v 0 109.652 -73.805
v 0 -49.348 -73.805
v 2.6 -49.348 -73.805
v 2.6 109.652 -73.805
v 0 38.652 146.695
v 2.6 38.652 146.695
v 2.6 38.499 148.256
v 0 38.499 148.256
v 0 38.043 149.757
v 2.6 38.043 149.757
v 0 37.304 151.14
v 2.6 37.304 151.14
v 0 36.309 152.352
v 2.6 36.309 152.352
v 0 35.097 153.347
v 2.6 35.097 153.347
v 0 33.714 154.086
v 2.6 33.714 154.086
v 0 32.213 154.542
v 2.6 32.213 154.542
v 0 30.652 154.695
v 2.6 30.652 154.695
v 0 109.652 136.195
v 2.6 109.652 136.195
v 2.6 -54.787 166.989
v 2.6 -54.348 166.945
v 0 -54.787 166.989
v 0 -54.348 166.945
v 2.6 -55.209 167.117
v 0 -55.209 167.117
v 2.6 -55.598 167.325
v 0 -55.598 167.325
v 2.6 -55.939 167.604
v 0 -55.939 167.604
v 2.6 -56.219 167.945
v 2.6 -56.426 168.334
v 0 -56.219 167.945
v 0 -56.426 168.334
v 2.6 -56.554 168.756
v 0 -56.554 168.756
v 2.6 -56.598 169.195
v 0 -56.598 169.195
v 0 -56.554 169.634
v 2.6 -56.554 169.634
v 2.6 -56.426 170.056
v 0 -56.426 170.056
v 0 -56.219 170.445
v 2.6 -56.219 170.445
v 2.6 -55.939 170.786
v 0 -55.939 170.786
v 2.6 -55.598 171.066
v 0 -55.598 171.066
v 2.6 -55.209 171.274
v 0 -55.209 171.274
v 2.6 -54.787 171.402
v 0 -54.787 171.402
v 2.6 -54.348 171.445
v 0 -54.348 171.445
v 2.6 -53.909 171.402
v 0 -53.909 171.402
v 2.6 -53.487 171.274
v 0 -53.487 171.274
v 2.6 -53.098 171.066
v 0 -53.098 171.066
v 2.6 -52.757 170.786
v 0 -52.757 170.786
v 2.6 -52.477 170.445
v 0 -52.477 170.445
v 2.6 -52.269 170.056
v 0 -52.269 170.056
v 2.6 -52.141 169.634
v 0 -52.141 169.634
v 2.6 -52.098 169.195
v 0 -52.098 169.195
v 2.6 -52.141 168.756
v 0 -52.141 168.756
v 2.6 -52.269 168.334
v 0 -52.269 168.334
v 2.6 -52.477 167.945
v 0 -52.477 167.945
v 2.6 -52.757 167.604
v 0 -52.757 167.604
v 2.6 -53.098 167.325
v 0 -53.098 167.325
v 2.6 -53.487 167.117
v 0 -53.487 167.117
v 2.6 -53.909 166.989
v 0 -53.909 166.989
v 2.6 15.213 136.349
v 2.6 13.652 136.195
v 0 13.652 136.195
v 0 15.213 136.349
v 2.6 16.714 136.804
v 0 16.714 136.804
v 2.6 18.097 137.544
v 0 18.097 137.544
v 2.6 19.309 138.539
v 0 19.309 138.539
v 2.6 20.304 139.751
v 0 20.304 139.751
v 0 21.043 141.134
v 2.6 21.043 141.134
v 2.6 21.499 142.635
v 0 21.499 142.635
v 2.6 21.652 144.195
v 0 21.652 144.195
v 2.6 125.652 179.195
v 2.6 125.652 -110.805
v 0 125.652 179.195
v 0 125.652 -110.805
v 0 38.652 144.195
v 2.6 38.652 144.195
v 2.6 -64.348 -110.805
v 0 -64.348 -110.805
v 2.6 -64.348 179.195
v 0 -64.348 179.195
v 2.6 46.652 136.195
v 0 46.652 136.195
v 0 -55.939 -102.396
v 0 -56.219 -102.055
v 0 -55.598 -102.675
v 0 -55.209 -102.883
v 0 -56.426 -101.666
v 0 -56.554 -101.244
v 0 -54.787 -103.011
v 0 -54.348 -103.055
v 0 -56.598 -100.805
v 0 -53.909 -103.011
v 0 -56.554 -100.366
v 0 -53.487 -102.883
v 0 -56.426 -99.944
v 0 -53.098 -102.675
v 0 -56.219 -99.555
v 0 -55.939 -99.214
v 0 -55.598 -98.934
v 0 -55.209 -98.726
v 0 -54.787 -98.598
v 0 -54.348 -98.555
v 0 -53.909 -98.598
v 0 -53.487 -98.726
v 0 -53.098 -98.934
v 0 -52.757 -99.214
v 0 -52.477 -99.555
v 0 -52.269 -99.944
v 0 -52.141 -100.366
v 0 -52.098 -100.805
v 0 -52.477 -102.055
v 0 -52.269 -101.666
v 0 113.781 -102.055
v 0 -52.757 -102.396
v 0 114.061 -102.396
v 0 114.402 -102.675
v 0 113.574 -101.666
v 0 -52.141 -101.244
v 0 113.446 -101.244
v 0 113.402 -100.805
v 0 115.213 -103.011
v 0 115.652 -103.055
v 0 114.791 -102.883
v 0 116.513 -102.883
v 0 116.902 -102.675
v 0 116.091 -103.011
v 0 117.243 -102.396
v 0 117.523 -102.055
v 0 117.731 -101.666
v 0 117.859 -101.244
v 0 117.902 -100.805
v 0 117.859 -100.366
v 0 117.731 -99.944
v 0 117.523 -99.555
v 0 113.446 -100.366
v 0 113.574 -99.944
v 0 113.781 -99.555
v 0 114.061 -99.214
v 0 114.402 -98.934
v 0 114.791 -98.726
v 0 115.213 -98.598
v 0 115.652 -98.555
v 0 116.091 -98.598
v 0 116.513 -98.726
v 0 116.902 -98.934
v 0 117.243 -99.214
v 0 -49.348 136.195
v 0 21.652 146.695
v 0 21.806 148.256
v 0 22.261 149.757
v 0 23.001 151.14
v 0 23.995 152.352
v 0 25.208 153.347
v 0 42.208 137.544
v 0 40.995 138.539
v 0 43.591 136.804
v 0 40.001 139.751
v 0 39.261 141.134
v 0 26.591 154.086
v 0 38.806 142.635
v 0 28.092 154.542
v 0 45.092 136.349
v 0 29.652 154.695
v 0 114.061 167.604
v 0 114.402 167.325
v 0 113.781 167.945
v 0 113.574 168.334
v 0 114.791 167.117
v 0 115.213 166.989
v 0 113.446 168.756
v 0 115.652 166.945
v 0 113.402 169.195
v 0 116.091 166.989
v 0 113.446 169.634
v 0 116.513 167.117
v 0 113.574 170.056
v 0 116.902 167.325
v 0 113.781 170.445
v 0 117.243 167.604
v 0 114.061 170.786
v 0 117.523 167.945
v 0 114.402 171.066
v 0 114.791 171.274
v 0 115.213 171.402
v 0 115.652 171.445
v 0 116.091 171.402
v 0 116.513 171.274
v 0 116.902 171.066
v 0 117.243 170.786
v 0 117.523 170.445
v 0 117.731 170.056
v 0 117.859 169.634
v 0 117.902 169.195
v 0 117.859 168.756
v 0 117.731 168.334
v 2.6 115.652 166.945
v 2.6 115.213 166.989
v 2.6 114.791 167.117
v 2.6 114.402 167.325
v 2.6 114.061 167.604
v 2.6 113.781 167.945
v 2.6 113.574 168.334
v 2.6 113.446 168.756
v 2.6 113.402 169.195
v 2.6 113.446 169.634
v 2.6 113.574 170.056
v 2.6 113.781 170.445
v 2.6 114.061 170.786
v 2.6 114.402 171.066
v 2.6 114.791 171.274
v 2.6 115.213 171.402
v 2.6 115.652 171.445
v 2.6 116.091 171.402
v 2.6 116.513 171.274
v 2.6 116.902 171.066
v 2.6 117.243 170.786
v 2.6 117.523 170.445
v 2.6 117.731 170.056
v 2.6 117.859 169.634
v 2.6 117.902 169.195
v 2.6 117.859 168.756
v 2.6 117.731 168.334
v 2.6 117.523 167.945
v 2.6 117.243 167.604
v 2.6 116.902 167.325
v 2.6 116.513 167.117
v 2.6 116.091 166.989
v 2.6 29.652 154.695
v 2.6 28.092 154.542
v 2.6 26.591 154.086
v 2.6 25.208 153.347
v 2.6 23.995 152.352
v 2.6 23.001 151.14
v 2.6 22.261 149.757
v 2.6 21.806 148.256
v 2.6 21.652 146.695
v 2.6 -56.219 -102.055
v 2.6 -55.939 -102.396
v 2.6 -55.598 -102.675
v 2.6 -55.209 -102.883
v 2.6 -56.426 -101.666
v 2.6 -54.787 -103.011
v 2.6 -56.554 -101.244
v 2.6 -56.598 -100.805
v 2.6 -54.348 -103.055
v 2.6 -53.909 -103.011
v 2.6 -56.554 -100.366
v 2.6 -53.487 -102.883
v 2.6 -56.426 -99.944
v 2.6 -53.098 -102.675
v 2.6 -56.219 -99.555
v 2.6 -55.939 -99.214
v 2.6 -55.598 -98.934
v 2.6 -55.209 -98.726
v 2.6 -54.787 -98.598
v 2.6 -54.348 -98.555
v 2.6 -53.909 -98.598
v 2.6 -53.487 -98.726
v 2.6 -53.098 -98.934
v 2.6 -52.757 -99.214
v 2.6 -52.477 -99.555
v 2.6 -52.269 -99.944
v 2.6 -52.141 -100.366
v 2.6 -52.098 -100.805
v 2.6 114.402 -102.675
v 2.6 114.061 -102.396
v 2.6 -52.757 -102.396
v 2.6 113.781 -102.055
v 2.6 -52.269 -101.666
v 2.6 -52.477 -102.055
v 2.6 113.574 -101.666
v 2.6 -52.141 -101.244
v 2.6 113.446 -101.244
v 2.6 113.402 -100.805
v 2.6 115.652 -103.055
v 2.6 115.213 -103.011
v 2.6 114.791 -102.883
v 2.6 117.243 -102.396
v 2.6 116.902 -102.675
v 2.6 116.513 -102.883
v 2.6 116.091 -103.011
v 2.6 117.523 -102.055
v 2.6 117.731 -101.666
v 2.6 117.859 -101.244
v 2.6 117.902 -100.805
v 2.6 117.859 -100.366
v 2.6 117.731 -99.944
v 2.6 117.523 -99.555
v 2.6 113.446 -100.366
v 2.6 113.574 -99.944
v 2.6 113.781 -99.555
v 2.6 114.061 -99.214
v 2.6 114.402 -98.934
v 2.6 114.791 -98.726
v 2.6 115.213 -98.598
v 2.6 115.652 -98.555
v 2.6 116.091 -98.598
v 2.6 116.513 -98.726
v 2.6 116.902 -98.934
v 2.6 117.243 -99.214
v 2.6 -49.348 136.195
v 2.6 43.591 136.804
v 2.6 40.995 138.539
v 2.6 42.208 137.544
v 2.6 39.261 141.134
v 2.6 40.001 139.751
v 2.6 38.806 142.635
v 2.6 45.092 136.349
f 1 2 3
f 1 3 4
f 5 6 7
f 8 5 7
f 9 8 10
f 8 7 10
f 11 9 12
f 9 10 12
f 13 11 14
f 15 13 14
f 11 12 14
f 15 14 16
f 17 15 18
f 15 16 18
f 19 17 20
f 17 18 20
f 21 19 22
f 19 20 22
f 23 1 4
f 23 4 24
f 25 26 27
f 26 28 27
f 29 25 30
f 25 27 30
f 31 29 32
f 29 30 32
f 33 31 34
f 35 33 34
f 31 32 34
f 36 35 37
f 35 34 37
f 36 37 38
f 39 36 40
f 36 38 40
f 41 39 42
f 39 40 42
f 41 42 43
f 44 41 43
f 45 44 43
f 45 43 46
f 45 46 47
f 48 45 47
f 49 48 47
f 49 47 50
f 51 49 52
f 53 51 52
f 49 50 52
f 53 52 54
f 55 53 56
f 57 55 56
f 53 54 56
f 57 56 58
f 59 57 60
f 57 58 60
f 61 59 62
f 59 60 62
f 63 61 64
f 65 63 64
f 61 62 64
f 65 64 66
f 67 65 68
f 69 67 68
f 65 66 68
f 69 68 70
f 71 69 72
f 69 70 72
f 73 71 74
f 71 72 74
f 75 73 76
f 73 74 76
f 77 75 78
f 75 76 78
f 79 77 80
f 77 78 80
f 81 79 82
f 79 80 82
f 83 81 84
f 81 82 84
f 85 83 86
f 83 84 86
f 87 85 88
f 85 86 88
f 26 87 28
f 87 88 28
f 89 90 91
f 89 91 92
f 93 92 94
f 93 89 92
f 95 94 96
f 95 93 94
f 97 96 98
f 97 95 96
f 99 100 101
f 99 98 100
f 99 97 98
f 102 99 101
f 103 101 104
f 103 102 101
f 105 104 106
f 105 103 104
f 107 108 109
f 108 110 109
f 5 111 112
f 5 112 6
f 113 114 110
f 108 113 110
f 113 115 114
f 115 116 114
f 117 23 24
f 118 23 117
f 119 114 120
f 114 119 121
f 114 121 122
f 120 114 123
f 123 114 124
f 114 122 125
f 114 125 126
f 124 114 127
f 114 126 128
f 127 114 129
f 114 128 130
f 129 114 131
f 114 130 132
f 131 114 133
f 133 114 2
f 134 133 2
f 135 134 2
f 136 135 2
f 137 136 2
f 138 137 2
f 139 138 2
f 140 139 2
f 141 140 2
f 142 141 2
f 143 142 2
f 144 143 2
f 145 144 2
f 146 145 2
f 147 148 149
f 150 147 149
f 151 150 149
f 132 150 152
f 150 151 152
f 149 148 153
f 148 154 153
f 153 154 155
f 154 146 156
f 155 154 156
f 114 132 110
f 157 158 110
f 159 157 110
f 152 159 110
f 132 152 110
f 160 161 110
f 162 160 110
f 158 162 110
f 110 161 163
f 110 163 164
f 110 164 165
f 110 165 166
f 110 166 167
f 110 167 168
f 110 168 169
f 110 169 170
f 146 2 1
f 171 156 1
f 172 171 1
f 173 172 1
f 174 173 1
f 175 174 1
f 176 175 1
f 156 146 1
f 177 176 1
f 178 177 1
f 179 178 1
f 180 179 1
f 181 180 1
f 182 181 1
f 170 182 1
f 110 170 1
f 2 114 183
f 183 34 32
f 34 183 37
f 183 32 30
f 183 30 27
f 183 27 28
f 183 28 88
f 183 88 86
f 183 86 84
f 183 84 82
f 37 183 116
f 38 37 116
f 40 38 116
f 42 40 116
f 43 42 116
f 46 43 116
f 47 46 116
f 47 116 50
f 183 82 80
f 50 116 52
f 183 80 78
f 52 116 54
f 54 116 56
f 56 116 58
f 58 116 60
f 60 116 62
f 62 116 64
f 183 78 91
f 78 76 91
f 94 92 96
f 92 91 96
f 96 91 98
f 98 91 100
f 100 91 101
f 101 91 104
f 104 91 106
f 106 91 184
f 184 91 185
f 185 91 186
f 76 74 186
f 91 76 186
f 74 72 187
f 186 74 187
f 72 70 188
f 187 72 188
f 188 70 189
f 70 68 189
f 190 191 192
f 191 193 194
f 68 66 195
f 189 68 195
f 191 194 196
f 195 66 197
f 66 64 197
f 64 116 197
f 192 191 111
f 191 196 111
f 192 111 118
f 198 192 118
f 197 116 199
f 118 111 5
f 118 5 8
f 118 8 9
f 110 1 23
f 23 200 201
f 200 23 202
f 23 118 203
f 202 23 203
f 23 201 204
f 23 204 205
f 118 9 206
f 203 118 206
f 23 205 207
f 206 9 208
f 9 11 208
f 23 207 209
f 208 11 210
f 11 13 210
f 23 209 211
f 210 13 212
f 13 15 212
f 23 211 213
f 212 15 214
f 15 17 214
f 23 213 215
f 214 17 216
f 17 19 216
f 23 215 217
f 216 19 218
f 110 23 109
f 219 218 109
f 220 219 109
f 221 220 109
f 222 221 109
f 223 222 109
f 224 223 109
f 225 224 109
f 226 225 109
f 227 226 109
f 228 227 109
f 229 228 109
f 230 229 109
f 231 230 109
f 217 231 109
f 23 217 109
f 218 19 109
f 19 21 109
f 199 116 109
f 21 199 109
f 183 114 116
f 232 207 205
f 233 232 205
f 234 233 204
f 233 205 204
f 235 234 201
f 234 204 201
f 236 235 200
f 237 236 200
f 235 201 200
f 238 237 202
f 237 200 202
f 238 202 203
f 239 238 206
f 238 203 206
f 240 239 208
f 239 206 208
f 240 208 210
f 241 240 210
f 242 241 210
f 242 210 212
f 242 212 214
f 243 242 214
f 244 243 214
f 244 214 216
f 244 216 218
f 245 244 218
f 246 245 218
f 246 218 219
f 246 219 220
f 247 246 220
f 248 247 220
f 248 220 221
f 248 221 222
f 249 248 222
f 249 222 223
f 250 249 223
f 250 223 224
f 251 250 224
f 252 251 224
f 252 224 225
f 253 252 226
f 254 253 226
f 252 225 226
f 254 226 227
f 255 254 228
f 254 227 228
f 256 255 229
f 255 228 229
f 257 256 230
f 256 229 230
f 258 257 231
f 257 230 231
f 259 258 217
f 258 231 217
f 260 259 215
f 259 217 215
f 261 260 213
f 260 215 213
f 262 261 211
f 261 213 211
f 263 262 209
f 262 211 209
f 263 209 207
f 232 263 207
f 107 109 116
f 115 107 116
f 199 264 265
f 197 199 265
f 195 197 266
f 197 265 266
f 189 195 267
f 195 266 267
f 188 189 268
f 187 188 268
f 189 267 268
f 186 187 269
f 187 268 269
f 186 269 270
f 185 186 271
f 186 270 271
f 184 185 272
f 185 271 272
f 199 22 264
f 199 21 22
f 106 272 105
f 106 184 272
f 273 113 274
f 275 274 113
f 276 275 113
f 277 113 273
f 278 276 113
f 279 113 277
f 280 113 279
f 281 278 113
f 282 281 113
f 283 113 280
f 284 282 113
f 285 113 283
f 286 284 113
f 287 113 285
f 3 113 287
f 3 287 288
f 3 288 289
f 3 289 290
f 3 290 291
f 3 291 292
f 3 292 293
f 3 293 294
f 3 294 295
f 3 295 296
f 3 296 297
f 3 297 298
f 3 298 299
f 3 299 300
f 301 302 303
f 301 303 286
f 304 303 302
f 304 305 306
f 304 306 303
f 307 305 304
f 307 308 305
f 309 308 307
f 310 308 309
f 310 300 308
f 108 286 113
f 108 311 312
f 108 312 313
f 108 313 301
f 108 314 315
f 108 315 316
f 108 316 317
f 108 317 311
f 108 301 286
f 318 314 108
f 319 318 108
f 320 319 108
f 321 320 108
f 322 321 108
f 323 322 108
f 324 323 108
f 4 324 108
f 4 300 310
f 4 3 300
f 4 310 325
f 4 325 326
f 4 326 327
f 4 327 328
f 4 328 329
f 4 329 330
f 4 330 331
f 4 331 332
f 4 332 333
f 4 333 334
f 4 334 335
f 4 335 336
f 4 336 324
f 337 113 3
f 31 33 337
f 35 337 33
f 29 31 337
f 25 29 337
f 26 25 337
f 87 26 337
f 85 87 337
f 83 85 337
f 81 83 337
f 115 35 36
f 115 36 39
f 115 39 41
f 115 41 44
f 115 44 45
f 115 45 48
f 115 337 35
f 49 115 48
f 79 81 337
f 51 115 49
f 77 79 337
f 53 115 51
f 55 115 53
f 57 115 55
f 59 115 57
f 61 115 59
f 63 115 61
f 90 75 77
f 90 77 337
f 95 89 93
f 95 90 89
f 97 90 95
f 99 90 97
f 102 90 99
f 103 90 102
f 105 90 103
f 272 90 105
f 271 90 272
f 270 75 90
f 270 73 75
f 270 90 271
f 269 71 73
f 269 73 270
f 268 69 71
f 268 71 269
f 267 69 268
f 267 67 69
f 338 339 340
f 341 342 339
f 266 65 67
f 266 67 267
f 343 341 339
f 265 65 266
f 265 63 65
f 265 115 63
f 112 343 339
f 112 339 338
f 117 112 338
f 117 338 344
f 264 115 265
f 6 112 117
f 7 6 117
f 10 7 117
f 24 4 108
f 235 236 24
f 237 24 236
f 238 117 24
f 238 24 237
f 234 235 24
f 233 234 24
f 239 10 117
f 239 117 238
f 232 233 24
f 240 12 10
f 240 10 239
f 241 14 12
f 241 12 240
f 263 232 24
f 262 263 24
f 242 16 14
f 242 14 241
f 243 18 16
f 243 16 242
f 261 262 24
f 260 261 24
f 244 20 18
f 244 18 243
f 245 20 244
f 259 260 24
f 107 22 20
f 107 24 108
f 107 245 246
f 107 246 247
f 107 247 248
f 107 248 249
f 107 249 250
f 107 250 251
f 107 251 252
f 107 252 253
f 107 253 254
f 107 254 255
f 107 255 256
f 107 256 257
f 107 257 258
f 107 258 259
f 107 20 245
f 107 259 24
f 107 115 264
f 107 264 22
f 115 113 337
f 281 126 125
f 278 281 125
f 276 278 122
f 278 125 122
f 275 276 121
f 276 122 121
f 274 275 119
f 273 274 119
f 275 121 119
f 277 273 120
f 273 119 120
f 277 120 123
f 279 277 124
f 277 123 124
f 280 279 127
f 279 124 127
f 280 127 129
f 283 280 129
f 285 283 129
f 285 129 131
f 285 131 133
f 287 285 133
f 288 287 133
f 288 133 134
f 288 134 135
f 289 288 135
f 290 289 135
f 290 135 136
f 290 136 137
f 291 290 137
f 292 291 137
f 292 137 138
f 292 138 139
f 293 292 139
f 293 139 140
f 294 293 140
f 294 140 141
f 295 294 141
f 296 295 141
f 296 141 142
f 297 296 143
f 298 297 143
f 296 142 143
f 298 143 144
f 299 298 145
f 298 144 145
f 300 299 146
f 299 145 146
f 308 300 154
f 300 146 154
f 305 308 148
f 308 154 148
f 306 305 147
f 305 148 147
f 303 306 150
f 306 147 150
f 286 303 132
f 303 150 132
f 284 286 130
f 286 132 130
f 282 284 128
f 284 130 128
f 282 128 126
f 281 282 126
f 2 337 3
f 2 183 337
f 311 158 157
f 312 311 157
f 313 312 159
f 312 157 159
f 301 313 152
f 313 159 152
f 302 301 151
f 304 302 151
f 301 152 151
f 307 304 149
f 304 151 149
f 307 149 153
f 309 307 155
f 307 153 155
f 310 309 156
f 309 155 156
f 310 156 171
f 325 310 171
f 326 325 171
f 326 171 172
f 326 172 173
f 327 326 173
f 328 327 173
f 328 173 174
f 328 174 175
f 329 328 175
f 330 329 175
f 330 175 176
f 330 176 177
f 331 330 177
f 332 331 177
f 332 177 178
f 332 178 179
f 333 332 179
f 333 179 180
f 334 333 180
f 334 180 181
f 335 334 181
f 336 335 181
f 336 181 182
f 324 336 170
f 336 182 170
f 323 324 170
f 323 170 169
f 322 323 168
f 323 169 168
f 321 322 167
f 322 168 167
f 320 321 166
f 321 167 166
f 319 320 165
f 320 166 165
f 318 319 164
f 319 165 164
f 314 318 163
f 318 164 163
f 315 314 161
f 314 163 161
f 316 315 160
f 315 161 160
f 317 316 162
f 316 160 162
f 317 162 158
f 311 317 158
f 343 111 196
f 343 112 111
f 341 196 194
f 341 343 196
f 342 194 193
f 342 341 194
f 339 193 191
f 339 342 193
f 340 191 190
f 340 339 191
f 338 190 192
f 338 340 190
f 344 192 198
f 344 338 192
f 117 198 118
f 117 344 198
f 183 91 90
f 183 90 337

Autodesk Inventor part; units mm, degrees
ref_plane "YZ Plane" through (0, 0, 0) normal (1, 0, 0) x (0, 1, 0)
ref_plane "XZ Plane" through (0, 0, 0) normal (0, 1, 0) x (-1, 0, 0)
ref_plane "XY Plane" through (0, 0, 0) normal (0, 0, 1) x (1, 0, 0)
sketch "スケッチ1" plane through (0, 0, 0) normal (1, 0, 0) x (0, 1, 0)
  line L0 (125.6523, 179.1954) -> (-64.3477, 179.1954)
  line L1 (-64.3477, 179.1954) -> (-64.3477, -110.8046)
  line L2 (-64.3477, -110.8046) -> (125.6523, -110.8046)
  line L3 (125.6523, -110.8046) -> (125.6523, 179.1954)
  point P0 (0, 0)
  dimension "d0" = 190
  dimension "d1" = 290
extrude "押し出し1" add sketch "スケッチ1" along normal blind 2.6
sketch "スケッチ2" plane through (2.6, 0, 0) normal (1, 0, 0) x (0, 0, -1)
  line L0 (-179.1954, 125.6523) -> (-179.1954, -64.3477) projected
  line L1 (-179.1954, -64.3477) -> (110.8046, -64.3477) projected
  line L2 (110.8046, -64.3477) -> (110.8046, 125.6523) projected
  line L3 (110.8046, 125.6523) -> (-179.1954, 125.6523) projected
  line L4 (-34.1954, 30.6523) -> (-34.1954, 125.6523)
  line L5 (110.8046, 125.6523) -> (-179.1954, 125.6523) projected
  line L6 (-34.1954, 30.6523) -> (110.8046, 30.6523)
  point P0 (0, 0)
  point P1 (-169.1954, 115.6523)
  point P2 (100.8046, 115.6523)
  point P3 (-169.1954, -54.3477)
  point P4 (100.8046, -54.3477)
  dimension "d4" = 10
  dimension "d5" = 10
hole "穴1" at (2.6, 115.6523, 169.1954) at (2.6, 115.6523, -100.8046) at (2.6, -54.3477, 169.1954) at (2.6, -54.3477, -100.8046) direction (-1, 0, 0) diameter 4.5 depth 10 tip angle 118
sketch "スケッチ4" plane through (0, 0, 0) normal (-1, 0, 0) x (0, 0, 1)
  line L0 (-73.8046, -49.3477) -> (-73.8046, 109.6523) projected
  line L1 (-73.8046, 109.6523) -> (136.1954, 109.6523) projected
  line L2 (136.1954, 109.6523) -> (136.1954, -49.3477) projected
  line L3 (136.1954, -49.3477) -> (-73.8046, -49.3477) projected
  point P0 (0, 0)
extrude "押し出し3" cut sketch "スケッチ4" against normal blind 10
sketch "スケッチ5" plane through (0, 0, 0) normal (-1, 0, 0) x (0, 0, 1)
  circle A0 centre (146.6954, 30.1523) radius 5.5 projected
  line L0 (136.1954, 109.6523) -> (136.1954, -49.3477) projected
  line L1 (136.1954, 38.6523) -> (154.6954, 38.6523)
  line L2 (154.6954, 38.6523) -> (154.6954, 21.6523)
  line L3 (154.6954, 21.6523) -> (136.1954, 21.6523)
  line L4 (136.1954, 21.6523) -> (136.1954, 38.6523)
  point P0 (0, 0)
  point P1 (136.1954, 21.6523)
  dimension "d21" = 8
  dimension "d22" = 8.5
  dimension "d23" = 8.5
extrude "押し出し4" cut sketch "スケッチ5" against normal blind 10 contours A0 | L1 L2 L3 L0
fillet "フィレット1" radius 8 4 edges at (1.3, 38.6523, 154.6954) (1.3, 21.6523, 154.6954) (1.3, 38.6523, 136.1954) (1.3, 21.6523, 136.1954)
properties part number "lc_box_side" material "ポリカーボネート、クリア"
